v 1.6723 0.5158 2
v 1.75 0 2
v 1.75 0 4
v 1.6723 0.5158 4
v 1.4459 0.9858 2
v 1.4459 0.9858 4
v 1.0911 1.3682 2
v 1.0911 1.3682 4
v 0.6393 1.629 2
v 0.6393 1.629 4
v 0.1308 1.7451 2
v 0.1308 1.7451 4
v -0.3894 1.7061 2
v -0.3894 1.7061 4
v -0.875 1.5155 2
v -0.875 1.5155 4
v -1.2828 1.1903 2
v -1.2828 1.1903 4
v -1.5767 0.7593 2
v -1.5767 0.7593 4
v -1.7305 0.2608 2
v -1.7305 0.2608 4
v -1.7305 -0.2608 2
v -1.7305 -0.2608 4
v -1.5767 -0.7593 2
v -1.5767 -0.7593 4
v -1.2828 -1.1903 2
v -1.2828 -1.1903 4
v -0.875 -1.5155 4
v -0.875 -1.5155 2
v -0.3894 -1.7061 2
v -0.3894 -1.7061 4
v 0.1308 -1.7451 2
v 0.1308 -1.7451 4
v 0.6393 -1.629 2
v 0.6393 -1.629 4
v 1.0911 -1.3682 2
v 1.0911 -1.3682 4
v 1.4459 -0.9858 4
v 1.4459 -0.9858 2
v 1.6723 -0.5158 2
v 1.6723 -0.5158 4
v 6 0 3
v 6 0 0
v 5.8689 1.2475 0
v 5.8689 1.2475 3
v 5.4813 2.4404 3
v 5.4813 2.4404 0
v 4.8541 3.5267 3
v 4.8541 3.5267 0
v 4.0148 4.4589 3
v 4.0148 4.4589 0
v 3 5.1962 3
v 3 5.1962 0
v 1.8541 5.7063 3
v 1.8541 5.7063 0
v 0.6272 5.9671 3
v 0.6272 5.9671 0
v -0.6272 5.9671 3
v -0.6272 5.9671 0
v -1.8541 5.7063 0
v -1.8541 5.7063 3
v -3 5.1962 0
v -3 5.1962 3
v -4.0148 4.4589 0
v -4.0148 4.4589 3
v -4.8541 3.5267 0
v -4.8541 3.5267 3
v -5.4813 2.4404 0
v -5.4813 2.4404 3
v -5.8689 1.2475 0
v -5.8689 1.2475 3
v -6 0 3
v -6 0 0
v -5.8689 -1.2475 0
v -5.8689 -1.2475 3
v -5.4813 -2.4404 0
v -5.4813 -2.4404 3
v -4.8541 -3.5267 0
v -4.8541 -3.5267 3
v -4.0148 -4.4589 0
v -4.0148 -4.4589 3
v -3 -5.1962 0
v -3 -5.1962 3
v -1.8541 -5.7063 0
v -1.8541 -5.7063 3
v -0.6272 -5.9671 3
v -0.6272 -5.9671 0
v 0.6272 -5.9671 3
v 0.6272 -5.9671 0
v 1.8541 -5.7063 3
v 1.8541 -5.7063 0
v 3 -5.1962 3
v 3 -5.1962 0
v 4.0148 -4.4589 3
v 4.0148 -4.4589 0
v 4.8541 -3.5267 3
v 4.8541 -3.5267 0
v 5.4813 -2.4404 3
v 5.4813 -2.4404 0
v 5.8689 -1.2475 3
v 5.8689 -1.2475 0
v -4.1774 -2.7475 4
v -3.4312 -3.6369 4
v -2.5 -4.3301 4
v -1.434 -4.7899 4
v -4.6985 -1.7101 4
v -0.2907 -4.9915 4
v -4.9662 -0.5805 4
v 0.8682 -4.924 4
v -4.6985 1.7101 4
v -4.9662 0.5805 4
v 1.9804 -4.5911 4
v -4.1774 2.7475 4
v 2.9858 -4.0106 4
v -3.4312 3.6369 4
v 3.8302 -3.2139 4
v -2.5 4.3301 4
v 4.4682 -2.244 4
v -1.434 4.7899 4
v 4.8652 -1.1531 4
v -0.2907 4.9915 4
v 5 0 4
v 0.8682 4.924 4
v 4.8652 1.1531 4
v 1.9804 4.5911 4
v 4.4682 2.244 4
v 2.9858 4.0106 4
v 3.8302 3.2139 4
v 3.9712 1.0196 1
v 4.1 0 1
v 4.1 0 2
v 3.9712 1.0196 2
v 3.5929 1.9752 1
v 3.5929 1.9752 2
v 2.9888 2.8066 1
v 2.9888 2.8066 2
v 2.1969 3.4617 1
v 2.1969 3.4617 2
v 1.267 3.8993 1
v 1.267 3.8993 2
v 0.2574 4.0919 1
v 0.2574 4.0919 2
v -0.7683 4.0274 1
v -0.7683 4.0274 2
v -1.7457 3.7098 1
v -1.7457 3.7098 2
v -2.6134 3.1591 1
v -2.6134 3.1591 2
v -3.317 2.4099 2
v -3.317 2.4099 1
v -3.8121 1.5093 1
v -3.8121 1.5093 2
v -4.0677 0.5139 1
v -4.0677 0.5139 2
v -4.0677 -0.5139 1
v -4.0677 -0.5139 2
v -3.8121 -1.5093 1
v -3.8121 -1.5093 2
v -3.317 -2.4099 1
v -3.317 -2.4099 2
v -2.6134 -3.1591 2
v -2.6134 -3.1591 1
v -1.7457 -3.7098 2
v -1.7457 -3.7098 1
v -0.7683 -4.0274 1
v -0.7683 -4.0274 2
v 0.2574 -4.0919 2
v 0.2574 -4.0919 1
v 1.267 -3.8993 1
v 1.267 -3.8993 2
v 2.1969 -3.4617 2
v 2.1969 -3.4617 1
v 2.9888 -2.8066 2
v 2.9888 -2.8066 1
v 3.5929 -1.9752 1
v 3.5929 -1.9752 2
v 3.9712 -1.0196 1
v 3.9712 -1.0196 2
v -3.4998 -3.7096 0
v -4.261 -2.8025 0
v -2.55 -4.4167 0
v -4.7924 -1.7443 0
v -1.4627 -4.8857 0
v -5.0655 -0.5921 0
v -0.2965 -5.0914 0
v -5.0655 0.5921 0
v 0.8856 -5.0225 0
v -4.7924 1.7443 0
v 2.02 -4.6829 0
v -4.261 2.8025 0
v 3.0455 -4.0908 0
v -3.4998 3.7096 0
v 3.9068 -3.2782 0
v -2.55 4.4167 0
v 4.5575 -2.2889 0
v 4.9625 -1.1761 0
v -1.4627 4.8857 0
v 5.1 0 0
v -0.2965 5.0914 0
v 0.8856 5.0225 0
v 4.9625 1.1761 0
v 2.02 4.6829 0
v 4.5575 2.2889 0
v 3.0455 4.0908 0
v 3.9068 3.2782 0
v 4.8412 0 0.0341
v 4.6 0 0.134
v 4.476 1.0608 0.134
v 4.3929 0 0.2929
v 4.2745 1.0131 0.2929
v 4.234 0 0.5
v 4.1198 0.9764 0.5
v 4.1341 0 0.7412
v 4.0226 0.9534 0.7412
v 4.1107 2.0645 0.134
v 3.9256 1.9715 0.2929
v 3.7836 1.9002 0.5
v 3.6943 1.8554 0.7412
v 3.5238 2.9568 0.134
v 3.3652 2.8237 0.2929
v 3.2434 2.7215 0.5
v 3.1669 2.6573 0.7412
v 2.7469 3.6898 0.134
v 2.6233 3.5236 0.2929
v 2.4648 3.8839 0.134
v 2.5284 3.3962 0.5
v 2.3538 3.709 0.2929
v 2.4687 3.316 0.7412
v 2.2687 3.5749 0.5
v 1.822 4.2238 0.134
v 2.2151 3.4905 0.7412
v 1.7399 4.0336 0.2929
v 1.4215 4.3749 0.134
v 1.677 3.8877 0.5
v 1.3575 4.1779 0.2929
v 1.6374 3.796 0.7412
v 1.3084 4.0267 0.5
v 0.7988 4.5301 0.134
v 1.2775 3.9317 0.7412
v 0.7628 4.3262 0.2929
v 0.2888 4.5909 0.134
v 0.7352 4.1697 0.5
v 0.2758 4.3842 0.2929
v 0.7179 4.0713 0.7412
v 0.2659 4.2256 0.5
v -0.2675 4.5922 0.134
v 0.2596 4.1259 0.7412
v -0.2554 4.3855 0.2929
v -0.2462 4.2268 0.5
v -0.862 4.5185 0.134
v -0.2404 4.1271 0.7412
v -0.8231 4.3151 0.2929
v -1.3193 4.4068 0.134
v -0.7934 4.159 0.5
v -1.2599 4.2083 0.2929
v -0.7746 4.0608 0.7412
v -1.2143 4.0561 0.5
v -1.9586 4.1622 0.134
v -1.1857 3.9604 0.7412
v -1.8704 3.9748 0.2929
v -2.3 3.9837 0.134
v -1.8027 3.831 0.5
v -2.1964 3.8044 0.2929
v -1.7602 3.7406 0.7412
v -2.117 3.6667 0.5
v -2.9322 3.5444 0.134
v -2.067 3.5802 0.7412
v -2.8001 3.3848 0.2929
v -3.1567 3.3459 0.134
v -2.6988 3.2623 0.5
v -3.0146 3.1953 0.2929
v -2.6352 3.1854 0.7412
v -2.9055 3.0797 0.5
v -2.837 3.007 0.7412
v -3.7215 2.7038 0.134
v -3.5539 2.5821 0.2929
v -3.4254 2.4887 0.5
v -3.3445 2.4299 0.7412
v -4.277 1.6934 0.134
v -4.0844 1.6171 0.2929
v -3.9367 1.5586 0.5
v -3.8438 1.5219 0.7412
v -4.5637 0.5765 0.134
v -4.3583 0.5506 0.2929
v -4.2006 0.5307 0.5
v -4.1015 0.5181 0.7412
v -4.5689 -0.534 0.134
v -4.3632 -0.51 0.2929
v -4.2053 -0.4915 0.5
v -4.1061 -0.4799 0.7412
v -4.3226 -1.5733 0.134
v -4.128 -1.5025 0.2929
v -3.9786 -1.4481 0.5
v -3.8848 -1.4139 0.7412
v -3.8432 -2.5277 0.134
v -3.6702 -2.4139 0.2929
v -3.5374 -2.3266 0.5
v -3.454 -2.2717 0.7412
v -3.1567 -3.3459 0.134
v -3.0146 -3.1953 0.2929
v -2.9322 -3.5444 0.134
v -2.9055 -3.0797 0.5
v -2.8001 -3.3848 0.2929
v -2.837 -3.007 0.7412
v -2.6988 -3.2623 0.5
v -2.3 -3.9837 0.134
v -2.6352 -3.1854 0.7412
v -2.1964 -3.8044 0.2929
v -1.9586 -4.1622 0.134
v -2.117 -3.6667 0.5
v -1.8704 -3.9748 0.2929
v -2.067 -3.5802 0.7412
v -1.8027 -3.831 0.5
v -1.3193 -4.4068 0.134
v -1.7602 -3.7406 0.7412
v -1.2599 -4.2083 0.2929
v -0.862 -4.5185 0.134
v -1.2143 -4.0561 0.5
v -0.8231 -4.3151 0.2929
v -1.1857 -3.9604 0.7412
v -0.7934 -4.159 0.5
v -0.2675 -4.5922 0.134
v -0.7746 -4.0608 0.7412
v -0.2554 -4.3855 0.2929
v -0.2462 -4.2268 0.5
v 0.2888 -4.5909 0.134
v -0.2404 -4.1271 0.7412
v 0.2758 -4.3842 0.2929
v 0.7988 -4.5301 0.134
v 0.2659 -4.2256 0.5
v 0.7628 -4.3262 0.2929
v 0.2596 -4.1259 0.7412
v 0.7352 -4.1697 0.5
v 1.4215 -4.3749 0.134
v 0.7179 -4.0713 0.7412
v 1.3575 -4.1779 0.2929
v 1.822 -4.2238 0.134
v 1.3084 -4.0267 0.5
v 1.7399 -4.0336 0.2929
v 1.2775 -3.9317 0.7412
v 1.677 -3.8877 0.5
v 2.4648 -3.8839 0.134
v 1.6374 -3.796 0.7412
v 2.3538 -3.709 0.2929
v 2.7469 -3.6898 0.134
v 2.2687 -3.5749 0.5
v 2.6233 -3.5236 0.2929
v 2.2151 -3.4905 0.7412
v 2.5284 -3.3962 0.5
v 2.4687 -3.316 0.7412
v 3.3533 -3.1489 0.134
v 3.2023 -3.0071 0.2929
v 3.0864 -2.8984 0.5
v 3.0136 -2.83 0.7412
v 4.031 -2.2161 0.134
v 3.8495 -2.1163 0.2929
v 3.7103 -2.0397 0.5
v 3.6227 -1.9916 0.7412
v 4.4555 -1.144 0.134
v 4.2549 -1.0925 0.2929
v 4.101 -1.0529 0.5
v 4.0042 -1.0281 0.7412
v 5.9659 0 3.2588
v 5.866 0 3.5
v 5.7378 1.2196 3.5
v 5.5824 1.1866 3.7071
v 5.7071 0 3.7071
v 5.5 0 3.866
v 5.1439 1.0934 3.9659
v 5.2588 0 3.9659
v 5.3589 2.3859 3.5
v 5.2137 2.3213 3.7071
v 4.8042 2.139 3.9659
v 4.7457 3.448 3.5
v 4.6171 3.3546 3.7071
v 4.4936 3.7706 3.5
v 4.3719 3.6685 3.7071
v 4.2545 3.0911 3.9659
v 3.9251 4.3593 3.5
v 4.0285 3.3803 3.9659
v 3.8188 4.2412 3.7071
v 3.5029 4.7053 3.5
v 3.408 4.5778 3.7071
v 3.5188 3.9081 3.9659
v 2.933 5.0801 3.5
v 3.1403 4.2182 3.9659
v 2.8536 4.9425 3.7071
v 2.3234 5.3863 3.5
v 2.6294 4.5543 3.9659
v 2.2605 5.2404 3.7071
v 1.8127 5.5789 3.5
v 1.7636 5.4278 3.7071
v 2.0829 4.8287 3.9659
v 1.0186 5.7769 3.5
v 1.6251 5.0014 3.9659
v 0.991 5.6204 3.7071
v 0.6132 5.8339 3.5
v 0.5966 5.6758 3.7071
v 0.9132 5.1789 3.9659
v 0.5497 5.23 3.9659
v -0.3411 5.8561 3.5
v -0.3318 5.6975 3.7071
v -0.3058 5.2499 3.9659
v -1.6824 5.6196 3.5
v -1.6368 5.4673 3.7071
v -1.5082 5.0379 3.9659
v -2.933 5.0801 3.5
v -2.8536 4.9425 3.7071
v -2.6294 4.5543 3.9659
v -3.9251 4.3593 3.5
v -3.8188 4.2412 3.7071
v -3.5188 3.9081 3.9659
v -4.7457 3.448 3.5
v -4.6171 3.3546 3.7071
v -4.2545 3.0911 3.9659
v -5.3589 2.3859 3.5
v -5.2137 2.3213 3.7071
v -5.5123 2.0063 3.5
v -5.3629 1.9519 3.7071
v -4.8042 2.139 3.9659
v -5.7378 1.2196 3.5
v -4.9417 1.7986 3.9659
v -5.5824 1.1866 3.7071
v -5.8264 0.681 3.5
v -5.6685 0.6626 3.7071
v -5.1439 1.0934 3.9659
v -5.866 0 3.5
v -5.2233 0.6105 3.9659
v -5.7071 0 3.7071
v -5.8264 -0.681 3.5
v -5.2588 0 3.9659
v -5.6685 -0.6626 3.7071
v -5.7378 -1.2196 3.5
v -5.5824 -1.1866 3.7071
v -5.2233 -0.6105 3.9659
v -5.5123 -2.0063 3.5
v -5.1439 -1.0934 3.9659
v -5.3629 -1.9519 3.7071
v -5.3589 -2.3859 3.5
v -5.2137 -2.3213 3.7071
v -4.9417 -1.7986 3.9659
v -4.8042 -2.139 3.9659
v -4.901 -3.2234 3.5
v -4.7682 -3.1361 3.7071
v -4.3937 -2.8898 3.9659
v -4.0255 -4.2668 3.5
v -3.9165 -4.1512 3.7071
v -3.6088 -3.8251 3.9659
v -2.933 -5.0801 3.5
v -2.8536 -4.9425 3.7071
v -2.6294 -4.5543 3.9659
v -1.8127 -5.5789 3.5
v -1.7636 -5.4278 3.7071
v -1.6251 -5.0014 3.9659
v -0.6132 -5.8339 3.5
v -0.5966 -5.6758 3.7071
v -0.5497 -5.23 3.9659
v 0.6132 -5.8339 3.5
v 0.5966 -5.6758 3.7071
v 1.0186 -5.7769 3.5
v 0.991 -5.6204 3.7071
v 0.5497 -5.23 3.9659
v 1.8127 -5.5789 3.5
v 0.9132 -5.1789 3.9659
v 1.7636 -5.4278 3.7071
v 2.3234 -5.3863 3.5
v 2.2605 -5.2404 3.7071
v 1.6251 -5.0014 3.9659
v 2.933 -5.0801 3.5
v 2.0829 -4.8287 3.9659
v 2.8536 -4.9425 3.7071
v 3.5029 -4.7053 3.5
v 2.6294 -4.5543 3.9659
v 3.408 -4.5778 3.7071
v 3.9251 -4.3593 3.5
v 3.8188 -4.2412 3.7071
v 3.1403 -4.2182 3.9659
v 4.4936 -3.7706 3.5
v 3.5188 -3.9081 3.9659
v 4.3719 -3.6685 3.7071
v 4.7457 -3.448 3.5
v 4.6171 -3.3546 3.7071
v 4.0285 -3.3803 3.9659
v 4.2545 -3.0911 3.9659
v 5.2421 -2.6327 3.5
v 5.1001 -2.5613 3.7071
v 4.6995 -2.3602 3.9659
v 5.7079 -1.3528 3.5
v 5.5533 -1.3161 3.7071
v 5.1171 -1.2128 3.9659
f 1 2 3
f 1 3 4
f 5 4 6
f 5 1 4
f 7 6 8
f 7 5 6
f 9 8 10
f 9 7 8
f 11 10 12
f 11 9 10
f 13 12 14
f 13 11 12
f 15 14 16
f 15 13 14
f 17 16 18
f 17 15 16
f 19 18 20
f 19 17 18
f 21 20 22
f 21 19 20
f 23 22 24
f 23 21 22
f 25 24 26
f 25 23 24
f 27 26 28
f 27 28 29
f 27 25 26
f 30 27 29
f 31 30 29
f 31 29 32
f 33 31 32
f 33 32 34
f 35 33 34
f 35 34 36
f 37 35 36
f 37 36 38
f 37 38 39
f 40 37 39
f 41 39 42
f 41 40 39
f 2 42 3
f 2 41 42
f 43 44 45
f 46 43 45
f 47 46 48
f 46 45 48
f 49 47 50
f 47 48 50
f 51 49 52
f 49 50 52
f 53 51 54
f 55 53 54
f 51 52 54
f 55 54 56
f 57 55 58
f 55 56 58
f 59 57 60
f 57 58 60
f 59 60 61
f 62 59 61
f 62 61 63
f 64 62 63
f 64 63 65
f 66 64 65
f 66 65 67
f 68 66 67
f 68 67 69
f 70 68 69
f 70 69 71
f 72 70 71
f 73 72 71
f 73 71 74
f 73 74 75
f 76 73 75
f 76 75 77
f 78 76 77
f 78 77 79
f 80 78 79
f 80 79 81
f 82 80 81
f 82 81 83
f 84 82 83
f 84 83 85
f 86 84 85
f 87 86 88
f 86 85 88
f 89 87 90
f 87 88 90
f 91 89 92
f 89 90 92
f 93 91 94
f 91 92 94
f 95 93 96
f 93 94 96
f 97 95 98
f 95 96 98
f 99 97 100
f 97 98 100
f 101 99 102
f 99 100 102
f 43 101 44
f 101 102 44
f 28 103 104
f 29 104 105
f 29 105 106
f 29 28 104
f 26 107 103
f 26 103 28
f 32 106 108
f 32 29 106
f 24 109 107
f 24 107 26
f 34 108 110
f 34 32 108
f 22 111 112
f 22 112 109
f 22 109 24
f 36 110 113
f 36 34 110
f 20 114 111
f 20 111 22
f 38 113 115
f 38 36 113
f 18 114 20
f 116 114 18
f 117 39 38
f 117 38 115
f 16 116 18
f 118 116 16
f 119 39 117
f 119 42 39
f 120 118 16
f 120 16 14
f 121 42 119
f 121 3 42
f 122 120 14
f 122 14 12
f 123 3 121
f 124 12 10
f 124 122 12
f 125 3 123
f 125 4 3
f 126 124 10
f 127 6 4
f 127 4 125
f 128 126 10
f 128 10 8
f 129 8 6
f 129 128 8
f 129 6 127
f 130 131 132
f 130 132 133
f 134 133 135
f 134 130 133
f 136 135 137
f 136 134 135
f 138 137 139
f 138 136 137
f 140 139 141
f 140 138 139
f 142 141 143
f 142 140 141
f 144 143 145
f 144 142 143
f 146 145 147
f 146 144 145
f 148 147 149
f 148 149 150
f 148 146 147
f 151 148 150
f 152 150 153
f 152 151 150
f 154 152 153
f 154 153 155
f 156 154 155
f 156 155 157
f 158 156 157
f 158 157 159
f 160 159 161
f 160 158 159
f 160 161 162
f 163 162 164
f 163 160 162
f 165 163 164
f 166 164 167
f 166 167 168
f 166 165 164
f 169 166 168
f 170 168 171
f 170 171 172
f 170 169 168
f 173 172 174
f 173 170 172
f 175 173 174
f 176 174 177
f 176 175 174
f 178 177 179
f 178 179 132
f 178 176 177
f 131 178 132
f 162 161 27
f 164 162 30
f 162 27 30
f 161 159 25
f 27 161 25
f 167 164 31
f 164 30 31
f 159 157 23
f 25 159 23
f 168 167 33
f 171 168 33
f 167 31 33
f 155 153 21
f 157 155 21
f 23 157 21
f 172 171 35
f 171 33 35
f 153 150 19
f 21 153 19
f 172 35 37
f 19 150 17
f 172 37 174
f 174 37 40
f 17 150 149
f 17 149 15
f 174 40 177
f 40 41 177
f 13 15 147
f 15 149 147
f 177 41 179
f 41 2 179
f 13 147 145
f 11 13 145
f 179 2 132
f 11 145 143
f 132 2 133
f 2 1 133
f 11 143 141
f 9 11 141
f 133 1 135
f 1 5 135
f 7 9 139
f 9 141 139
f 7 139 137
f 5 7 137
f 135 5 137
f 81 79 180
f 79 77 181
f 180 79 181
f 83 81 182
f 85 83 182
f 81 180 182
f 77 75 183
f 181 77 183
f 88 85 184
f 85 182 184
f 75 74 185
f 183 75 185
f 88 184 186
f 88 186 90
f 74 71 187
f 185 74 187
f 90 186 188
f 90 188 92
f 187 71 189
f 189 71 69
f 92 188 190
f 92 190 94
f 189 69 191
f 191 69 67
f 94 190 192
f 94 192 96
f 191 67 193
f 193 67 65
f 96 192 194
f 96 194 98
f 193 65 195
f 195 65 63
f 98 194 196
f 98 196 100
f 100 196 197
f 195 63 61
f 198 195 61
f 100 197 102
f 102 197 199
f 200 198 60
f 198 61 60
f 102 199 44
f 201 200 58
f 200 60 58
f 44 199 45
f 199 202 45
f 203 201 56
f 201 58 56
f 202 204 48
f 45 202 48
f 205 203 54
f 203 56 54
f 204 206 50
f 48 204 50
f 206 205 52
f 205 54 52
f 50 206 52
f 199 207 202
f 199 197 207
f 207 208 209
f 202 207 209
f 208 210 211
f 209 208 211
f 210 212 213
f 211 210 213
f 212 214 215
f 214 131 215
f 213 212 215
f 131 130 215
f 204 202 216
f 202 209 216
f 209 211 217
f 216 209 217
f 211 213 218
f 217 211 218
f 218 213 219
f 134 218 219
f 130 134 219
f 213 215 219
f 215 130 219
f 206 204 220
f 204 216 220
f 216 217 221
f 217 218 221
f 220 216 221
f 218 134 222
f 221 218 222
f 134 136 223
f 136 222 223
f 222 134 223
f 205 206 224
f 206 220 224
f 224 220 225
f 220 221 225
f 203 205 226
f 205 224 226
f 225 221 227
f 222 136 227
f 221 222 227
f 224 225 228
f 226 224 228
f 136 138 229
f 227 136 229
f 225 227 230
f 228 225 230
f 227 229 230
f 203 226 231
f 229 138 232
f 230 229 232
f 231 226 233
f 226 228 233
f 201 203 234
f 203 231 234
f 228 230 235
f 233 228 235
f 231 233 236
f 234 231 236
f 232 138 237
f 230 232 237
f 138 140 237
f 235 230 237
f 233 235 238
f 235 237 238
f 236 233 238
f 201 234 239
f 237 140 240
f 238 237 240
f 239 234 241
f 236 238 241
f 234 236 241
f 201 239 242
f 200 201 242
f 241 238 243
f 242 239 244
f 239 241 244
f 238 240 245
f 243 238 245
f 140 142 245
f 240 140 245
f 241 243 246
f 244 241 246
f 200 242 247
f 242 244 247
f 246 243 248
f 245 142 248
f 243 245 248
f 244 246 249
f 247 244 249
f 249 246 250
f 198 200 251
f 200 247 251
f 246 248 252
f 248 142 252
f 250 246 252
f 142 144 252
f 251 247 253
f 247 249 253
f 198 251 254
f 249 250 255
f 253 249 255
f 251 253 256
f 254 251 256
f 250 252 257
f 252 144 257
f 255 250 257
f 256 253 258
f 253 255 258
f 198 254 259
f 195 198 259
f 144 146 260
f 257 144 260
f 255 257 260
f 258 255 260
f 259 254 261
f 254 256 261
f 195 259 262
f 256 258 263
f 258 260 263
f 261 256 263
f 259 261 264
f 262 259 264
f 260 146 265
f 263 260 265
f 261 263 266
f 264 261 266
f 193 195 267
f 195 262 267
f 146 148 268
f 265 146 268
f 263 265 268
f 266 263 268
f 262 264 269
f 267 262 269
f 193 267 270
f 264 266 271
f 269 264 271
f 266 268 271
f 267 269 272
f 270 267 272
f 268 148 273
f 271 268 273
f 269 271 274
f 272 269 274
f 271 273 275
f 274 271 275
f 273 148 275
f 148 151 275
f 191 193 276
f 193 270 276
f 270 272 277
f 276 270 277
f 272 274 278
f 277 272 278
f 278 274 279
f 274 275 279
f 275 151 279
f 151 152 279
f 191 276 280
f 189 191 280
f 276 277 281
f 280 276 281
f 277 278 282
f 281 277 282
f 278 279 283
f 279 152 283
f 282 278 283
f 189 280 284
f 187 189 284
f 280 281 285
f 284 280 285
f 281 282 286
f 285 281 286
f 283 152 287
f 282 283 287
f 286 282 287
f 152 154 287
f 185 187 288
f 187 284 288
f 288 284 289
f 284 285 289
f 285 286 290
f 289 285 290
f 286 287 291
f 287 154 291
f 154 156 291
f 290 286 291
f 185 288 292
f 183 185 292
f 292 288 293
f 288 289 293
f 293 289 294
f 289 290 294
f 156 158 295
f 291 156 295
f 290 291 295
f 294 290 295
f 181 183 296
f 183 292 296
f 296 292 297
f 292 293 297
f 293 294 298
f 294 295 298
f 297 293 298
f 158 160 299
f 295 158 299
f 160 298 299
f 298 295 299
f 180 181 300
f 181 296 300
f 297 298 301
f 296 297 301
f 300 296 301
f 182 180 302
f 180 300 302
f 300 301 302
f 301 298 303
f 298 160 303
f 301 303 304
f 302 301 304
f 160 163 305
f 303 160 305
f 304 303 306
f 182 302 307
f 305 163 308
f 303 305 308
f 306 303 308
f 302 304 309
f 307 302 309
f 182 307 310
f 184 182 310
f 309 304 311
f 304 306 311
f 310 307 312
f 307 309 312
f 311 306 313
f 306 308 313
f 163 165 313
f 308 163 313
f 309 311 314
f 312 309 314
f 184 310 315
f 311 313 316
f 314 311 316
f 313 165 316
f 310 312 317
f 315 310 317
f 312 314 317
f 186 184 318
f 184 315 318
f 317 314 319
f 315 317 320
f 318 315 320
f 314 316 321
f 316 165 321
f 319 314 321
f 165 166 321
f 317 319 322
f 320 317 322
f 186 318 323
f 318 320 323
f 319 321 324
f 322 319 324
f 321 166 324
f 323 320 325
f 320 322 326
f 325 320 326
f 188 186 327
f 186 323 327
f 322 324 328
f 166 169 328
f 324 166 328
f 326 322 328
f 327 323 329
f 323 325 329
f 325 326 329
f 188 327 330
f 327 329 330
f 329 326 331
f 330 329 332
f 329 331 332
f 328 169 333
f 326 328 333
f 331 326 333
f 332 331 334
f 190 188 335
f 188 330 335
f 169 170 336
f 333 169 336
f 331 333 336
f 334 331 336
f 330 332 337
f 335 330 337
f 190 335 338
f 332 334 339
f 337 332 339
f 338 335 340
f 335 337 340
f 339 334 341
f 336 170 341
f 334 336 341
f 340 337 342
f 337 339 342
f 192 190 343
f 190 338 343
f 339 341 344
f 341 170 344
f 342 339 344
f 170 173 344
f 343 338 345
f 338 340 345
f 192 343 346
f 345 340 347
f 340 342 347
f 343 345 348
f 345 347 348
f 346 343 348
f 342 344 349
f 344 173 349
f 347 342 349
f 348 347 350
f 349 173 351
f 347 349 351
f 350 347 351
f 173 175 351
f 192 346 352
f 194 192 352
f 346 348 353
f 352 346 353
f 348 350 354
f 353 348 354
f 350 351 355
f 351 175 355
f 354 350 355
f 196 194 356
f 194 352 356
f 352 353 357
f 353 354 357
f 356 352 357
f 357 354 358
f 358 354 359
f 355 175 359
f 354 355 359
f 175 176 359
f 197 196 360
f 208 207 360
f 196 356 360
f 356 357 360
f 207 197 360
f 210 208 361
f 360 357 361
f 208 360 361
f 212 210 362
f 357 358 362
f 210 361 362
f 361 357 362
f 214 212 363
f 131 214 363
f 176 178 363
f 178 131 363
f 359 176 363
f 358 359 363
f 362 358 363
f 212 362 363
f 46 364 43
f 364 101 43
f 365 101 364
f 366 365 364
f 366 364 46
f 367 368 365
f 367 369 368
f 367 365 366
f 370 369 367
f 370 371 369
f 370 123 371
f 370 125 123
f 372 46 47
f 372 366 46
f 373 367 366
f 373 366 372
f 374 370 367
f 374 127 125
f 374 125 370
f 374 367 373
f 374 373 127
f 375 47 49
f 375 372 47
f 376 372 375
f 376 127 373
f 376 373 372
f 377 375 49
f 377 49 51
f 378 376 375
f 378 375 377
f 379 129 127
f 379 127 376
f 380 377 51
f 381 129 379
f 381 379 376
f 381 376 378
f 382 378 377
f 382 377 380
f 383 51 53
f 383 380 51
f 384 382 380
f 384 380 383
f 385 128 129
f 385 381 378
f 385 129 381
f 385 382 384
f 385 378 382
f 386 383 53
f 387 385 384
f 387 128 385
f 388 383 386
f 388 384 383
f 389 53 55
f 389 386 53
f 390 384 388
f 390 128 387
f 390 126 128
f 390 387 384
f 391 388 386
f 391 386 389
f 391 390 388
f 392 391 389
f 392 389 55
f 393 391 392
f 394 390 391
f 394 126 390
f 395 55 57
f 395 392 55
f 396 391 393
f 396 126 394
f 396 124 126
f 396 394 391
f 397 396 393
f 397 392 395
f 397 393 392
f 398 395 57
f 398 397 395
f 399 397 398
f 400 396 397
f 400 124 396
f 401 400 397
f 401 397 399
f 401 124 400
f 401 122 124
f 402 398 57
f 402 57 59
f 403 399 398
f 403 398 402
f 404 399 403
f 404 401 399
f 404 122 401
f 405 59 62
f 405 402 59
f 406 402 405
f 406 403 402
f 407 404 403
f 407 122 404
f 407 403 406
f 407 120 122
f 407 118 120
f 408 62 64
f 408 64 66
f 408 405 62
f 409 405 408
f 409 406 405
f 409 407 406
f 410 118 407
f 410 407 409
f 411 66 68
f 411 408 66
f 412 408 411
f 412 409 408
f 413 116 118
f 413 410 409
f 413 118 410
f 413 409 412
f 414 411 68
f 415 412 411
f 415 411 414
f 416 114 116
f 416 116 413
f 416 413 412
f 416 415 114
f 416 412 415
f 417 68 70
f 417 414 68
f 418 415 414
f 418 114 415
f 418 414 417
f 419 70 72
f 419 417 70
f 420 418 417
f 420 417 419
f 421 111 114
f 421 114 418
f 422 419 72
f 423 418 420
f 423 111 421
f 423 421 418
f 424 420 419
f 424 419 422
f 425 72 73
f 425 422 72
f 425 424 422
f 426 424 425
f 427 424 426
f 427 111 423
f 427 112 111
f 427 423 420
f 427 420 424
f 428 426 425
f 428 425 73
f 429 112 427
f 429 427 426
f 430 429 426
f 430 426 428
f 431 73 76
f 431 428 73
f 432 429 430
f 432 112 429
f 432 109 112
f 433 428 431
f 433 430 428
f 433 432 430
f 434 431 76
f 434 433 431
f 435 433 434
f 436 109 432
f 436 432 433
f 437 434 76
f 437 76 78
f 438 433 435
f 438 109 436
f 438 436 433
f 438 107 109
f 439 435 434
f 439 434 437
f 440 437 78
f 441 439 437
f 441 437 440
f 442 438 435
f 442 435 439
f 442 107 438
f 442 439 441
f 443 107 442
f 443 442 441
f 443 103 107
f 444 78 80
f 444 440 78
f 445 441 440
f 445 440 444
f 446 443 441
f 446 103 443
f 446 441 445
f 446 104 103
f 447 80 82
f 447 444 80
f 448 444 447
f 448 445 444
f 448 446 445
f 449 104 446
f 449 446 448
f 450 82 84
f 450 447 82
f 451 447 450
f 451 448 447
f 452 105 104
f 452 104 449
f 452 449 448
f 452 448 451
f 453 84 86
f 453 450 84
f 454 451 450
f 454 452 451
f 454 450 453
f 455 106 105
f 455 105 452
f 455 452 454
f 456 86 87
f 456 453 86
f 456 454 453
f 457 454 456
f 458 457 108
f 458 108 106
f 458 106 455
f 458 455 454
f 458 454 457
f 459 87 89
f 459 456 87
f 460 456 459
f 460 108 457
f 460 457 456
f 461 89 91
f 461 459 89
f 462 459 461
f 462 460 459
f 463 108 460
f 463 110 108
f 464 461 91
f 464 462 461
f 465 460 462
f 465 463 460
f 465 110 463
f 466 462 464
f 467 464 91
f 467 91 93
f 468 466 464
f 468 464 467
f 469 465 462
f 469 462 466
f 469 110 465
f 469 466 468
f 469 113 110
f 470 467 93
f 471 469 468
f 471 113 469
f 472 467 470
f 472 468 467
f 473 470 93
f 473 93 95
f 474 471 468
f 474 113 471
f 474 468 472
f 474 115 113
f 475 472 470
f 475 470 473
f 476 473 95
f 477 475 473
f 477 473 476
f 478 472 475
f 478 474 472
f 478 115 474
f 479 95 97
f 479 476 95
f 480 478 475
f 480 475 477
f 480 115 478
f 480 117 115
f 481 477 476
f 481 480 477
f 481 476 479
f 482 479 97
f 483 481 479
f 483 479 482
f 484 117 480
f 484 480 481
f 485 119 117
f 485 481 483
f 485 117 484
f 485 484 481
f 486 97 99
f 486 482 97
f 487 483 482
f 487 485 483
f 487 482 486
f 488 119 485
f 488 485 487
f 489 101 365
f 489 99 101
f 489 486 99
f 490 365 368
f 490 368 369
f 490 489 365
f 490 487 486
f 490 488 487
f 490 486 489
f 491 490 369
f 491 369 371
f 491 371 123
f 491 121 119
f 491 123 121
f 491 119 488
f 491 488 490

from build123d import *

# Parameters (mm, degrees)
SKETCH1_R           = 6
SKETCH1_R_2         = 4.1
BOSS_EXTRUDE1_DEPTH = 2
SKETCH2_R           = 6
SKETCH2_R_2         = 1.75
BOSS_EXTRUDE2_DEPTH = 2
FILLET1_R           = 1


with BuildPart() as part:
    # Sketch1 → Boss-Extrude1 (new body)
    with BuildSketch(Plane.XY):
        Circle(SKETCH1_R)
        Circle(SKETCH1_R_2, mode=Mode.SUBTRACT)
    extrude(amount=BOSS_EXTRUDE1_DEPTH)

    # Sketch2 → Boss-Extrude2 (add)
    with BuildSketch(Plane.XY.offset(2)):
        Circle(SKETCH2_R)
        Circle(SKETCH2_R_2, mode=Mode.SUBTRACT)
    extrude(amount=BOSS_EXTRUDE2_DEPTH)

    # Fillet1
    fillet1_edges = [part.edges().sort_by_distance(p)[0] for p in [
        (-6, 0, 4),
        (-4.1, 0, 0),
    ]]
    fillet(fillet1_edges, radius=FILLET1_R)


solid = part.part
